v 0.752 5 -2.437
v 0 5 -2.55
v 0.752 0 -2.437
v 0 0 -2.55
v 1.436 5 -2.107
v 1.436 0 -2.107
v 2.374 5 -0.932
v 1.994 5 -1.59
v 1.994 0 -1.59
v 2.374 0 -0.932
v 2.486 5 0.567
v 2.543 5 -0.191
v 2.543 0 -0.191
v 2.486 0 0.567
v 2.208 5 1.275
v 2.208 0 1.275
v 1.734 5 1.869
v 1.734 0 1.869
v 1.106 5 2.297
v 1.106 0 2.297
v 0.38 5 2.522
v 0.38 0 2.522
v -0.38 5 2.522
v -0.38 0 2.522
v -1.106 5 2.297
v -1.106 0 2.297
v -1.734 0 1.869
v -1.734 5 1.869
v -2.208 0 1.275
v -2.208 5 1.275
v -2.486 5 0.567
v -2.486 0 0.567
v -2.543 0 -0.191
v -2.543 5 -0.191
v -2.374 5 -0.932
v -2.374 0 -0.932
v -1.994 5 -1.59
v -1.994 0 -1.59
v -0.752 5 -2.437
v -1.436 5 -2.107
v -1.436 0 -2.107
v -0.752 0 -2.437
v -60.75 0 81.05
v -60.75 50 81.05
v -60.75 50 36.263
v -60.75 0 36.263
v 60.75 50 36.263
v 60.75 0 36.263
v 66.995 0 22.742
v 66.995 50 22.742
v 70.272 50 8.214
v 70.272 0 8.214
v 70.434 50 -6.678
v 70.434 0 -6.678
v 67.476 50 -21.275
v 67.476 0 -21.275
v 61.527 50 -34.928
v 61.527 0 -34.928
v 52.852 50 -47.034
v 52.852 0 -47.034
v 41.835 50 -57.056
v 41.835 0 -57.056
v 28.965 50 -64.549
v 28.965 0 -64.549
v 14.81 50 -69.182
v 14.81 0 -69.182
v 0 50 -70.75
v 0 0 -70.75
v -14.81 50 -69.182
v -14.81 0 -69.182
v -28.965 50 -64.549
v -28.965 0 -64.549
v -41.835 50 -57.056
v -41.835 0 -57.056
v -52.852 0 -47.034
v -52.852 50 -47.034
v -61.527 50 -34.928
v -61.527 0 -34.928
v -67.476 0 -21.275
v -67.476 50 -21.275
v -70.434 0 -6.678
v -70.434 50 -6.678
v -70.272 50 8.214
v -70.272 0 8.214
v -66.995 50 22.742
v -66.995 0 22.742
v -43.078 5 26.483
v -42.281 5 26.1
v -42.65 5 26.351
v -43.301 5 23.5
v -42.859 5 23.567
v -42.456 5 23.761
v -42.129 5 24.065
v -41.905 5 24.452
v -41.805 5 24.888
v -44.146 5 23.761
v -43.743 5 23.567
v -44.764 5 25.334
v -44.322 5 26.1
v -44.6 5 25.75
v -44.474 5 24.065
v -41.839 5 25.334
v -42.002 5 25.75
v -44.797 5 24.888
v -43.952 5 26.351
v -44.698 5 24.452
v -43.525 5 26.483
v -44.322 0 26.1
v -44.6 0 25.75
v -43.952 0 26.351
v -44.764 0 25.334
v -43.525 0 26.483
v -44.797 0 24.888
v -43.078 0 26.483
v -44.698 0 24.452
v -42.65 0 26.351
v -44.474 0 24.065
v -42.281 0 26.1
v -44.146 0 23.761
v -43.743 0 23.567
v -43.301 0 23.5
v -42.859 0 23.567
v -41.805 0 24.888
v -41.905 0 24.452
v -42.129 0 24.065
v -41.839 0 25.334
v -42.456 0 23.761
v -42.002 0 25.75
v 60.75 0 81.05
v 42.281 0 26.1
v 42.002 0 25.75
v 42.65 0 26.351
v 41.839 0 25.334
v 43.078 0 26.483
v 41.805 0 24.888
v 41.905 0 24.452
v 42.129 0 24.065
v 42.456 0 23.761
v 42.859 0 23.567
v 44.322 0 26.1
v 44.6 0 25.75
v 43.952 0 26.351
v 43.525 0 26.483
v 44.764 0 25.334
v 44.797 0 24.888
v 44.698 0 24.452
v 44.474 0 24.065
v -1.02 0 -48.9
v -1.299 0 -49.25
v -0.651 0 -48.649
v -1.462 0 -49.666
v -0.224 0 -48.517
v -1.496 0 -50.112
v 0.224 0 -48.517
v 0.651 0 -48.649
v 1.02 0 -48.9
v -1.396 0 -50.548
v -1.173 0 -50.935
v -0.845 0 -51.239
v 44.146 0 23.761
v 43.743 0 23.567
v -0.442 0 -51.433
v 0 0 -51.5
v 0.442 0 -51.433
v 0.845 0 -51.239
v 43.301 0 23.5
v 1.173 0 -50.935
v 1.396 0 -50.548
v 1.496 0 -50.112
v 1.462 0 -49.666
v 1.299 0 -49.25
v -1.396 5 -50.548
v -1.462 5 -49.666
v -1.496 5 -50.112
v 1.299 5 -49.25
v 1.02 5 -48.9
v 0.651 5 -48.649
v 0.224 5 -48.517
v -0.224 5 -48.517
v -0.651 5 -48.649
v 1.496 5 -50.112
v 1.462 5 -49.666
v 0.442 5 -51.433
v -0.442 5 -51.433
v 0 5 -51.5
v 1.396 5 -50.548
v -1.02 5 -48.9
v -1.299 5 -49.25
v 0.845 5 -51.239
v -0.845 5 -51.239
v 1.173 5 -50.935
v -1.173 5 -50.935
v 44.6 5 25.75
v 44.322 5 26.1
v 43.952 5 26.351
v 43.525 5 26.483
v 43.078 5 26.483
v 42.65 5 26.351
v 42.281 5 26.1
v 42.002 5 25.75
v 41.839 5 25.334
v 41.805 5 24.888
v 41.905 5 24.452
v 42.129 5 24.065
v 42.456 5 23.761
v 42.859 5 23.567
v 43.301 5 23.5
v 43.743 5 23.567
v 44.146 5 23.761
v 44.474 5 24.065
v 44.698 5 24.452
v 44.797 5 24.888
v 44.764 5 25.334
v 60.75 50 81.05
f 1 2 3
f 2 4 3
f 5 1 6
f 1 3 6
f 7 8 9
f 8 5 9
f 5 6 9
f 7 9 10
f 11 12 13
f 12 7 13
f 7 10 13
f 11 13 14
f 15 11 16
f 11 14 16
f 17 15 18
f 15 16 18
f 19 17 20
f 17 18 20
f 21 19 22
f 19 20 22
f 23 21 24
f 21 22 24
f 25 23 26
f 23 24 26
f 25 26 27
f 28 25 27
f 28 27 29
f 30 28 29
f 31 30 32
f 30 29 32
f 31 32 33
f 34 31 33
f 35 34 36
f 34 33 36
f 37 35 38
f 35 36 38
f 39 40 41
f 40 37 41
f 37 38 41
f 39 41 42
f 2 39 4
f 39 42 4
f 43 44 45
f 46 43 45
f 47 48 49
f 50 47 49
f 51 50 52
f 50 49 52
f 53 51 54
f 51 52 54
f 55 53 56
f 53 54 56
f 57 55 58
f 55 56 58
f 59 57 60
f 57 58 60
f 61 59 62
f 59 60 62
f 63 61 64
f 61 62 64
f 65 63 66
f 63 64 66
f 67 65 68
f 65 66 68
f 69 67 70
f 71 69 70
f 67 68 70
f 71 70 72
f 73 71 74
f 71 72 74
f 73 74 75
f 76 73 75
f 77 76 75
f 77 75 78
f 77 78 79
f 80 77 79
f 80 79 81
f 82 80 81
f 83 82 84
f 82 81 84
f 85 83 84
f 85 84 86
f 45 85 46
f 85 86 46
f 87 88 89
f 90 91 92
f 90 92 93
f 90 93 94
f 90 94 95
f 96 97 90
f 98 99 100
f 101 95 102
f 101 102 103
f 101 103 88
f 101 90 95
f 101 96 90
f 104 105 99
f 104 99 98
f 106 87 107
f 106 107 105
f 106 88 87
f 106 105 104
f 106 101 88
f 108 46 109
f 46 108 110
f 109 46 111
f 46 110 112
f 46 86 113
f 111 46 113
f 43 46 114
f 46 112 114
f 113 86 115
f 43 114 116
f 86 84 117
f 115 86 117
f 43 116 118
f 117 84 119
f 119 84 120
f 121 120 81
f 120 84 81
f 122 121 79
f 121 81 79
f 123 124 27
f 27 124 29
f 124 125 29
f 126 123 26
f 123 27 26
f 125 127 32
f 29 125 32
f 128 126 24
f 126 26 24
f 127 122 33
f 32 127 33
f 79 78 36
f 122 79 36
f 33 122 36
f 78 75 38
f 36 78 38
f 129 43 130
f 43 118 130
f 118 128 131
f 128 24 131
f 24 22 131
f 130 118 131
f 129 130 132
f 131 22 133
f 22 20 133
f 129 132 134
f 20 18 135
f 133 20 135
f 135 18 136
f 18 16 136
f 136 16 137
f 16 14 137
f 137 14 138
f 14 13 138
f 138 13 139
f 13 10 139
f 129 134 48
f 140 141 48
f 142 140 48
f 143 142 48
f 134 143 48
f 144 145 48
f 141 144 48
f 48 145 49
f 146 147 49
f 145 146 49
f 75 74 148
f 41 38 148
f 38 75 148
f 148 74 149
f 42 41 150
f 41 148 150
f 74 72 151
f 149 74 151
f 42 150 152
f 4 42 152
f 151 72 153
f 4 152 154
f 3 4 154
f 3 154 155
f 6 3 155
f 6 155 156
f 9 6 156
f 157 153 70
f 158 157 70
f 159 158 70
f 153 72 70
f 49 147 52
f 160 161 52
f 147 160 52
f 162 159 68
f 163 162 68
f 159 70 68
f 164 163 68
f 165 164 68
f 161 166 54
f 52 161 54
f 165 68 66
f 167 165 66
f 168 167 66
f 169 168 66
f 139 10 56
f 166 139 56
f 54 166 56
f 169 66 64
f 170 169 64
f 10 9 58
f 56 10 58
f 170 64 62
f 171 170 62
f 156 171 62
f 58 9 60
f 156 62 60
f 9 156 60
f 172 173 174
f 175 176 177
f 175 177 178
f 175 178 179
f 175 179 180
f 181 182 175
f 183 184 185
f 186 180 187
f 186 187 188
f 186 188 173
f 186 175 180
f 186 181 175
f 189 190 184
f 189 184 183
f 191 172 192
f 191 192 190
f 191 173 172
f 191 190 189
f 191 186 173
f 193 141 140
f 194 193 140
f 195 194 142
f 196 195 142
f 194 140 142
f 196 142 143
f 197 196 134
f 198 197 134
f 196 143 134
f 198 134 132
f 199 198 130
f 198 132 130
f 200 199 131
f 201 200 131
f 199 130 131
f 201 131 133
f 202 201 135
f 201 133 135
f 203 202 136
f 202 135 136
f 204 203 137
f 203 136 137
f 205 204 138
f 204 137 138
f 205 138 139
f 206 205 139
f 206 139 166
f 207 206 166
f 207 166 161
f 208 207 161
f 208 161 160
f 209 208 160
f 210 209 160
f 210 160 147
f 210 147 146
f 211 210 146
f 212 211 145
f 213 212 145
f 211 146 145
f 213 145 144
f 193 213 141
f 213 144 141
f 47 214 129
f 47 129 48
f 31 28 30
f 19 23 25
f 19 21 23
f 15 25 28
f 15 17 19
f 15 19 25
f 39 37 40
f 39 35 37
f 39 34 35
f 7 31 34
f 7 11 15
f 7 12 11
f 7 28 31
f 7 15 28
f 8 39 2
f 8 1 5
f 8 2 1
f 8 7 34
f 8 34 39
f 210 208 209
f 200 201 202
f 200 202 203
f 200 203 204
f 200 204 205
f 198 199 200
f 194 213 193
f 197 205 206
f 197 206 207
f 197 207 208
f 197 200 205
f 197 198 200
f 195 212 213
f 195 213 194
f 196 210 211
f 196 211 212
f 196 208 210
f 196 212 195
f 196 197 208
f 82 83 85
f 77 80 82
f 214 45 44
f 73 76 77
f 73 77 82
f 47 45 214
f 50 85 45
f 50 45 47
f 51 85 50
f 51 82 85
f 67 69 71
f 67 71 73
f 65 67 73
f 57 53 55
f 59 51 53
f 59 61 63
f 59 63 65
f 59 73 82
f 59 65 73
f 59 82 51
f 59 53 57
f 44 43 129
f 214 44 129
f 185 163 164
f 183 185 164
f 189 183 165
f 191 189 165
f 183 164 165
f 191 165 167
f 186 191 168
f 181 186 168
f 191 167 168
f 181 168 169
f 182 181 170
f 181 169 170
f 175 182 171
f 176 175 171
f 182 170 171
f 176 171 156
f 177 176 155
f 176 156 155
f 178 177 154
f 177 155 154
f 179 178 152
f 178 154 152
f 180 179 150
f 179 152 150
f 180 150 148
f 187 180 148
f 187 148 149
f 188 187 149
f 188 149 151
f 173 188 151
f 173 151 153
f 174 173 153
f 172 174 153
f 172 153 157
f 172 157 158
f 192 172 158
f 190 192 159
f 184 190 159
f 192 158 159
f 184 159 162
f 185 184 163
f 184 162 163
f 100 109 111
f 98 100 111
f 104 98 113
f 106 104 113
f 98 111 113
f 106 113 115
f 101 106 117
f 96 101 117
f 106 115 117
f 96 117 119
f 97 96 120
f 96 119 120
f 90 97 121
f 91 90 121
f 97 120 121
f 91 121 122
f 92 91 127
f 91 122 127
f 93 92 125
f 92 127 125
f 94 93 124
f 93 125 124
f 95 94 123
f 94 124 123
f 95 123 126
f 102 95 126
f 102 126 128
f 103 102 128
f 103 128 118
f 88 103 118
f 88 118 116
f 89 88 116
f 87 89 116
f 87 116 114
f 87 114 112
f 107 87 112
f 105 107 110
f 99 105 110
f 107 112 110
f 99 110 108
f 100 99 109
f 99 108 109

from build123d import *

# Parameters (mm, degrees)
SKETCH1_R           = 70.75
SKETCH1_W           = 121.5
SKETCH1_H           = 44.787071271
BOSS_EXTRUDE1_DEPTH = 50
SKETCH2_R           = 1.5
SKETCH2_R_2         = 2.55
CUT_EXTRUDE1_DEPTH  = 5
CIRPATTERN1_COUNT   = 3


with BuildPart() as part:
    # Sketch1 → Boss-Extrude1 (new body)
    with BuildSketch(Plane(origin=(0, 0, 0), x_dir=(1, 0, 0), z_dir=(0, 1, 0))):
        Circle(SKETCH1_R)
        with Locations((0, -58.656464365)):
            Rectangle(SKETCH1_W, SKETCH1_H)
    extrude(amount=BOSS_EXTRUDE1_DEPTH)

    # Sketch2 → Cut-Extrude1 (cut)
    with BuildSketch(Plane(origin=(0, 0, 0), x_dir=(-1, 0, 0), z_dir=(0, -1, 0))):
        with Locations(Location((0, 50, 0), (0, 0, 90))):
            Circle(SKETCH2_R)
        with Locations(Location((0, 0, 0), (0, 0, 90))):
            Circle(SKETCH2_R_2)
    cut_extrude1 = extrude(amount=-CUT_EXTRUDE1_DEPTH, mode=Mode.SUBTRACT)

    # CirPattern1: Cut-Extrude1 ×3 about axis
    cirpattern1_axis = Axis((0, 0, 0), (0, 1, 0))
    for i in range(1, CIRPATTERN1_COUNT):
        add(cut_extrude1.rotate(cirpattern1_axis, i * 360 / CIRPATTERN1_COUNT), mode=Mode.SUBTRACT)


solid = part.part
